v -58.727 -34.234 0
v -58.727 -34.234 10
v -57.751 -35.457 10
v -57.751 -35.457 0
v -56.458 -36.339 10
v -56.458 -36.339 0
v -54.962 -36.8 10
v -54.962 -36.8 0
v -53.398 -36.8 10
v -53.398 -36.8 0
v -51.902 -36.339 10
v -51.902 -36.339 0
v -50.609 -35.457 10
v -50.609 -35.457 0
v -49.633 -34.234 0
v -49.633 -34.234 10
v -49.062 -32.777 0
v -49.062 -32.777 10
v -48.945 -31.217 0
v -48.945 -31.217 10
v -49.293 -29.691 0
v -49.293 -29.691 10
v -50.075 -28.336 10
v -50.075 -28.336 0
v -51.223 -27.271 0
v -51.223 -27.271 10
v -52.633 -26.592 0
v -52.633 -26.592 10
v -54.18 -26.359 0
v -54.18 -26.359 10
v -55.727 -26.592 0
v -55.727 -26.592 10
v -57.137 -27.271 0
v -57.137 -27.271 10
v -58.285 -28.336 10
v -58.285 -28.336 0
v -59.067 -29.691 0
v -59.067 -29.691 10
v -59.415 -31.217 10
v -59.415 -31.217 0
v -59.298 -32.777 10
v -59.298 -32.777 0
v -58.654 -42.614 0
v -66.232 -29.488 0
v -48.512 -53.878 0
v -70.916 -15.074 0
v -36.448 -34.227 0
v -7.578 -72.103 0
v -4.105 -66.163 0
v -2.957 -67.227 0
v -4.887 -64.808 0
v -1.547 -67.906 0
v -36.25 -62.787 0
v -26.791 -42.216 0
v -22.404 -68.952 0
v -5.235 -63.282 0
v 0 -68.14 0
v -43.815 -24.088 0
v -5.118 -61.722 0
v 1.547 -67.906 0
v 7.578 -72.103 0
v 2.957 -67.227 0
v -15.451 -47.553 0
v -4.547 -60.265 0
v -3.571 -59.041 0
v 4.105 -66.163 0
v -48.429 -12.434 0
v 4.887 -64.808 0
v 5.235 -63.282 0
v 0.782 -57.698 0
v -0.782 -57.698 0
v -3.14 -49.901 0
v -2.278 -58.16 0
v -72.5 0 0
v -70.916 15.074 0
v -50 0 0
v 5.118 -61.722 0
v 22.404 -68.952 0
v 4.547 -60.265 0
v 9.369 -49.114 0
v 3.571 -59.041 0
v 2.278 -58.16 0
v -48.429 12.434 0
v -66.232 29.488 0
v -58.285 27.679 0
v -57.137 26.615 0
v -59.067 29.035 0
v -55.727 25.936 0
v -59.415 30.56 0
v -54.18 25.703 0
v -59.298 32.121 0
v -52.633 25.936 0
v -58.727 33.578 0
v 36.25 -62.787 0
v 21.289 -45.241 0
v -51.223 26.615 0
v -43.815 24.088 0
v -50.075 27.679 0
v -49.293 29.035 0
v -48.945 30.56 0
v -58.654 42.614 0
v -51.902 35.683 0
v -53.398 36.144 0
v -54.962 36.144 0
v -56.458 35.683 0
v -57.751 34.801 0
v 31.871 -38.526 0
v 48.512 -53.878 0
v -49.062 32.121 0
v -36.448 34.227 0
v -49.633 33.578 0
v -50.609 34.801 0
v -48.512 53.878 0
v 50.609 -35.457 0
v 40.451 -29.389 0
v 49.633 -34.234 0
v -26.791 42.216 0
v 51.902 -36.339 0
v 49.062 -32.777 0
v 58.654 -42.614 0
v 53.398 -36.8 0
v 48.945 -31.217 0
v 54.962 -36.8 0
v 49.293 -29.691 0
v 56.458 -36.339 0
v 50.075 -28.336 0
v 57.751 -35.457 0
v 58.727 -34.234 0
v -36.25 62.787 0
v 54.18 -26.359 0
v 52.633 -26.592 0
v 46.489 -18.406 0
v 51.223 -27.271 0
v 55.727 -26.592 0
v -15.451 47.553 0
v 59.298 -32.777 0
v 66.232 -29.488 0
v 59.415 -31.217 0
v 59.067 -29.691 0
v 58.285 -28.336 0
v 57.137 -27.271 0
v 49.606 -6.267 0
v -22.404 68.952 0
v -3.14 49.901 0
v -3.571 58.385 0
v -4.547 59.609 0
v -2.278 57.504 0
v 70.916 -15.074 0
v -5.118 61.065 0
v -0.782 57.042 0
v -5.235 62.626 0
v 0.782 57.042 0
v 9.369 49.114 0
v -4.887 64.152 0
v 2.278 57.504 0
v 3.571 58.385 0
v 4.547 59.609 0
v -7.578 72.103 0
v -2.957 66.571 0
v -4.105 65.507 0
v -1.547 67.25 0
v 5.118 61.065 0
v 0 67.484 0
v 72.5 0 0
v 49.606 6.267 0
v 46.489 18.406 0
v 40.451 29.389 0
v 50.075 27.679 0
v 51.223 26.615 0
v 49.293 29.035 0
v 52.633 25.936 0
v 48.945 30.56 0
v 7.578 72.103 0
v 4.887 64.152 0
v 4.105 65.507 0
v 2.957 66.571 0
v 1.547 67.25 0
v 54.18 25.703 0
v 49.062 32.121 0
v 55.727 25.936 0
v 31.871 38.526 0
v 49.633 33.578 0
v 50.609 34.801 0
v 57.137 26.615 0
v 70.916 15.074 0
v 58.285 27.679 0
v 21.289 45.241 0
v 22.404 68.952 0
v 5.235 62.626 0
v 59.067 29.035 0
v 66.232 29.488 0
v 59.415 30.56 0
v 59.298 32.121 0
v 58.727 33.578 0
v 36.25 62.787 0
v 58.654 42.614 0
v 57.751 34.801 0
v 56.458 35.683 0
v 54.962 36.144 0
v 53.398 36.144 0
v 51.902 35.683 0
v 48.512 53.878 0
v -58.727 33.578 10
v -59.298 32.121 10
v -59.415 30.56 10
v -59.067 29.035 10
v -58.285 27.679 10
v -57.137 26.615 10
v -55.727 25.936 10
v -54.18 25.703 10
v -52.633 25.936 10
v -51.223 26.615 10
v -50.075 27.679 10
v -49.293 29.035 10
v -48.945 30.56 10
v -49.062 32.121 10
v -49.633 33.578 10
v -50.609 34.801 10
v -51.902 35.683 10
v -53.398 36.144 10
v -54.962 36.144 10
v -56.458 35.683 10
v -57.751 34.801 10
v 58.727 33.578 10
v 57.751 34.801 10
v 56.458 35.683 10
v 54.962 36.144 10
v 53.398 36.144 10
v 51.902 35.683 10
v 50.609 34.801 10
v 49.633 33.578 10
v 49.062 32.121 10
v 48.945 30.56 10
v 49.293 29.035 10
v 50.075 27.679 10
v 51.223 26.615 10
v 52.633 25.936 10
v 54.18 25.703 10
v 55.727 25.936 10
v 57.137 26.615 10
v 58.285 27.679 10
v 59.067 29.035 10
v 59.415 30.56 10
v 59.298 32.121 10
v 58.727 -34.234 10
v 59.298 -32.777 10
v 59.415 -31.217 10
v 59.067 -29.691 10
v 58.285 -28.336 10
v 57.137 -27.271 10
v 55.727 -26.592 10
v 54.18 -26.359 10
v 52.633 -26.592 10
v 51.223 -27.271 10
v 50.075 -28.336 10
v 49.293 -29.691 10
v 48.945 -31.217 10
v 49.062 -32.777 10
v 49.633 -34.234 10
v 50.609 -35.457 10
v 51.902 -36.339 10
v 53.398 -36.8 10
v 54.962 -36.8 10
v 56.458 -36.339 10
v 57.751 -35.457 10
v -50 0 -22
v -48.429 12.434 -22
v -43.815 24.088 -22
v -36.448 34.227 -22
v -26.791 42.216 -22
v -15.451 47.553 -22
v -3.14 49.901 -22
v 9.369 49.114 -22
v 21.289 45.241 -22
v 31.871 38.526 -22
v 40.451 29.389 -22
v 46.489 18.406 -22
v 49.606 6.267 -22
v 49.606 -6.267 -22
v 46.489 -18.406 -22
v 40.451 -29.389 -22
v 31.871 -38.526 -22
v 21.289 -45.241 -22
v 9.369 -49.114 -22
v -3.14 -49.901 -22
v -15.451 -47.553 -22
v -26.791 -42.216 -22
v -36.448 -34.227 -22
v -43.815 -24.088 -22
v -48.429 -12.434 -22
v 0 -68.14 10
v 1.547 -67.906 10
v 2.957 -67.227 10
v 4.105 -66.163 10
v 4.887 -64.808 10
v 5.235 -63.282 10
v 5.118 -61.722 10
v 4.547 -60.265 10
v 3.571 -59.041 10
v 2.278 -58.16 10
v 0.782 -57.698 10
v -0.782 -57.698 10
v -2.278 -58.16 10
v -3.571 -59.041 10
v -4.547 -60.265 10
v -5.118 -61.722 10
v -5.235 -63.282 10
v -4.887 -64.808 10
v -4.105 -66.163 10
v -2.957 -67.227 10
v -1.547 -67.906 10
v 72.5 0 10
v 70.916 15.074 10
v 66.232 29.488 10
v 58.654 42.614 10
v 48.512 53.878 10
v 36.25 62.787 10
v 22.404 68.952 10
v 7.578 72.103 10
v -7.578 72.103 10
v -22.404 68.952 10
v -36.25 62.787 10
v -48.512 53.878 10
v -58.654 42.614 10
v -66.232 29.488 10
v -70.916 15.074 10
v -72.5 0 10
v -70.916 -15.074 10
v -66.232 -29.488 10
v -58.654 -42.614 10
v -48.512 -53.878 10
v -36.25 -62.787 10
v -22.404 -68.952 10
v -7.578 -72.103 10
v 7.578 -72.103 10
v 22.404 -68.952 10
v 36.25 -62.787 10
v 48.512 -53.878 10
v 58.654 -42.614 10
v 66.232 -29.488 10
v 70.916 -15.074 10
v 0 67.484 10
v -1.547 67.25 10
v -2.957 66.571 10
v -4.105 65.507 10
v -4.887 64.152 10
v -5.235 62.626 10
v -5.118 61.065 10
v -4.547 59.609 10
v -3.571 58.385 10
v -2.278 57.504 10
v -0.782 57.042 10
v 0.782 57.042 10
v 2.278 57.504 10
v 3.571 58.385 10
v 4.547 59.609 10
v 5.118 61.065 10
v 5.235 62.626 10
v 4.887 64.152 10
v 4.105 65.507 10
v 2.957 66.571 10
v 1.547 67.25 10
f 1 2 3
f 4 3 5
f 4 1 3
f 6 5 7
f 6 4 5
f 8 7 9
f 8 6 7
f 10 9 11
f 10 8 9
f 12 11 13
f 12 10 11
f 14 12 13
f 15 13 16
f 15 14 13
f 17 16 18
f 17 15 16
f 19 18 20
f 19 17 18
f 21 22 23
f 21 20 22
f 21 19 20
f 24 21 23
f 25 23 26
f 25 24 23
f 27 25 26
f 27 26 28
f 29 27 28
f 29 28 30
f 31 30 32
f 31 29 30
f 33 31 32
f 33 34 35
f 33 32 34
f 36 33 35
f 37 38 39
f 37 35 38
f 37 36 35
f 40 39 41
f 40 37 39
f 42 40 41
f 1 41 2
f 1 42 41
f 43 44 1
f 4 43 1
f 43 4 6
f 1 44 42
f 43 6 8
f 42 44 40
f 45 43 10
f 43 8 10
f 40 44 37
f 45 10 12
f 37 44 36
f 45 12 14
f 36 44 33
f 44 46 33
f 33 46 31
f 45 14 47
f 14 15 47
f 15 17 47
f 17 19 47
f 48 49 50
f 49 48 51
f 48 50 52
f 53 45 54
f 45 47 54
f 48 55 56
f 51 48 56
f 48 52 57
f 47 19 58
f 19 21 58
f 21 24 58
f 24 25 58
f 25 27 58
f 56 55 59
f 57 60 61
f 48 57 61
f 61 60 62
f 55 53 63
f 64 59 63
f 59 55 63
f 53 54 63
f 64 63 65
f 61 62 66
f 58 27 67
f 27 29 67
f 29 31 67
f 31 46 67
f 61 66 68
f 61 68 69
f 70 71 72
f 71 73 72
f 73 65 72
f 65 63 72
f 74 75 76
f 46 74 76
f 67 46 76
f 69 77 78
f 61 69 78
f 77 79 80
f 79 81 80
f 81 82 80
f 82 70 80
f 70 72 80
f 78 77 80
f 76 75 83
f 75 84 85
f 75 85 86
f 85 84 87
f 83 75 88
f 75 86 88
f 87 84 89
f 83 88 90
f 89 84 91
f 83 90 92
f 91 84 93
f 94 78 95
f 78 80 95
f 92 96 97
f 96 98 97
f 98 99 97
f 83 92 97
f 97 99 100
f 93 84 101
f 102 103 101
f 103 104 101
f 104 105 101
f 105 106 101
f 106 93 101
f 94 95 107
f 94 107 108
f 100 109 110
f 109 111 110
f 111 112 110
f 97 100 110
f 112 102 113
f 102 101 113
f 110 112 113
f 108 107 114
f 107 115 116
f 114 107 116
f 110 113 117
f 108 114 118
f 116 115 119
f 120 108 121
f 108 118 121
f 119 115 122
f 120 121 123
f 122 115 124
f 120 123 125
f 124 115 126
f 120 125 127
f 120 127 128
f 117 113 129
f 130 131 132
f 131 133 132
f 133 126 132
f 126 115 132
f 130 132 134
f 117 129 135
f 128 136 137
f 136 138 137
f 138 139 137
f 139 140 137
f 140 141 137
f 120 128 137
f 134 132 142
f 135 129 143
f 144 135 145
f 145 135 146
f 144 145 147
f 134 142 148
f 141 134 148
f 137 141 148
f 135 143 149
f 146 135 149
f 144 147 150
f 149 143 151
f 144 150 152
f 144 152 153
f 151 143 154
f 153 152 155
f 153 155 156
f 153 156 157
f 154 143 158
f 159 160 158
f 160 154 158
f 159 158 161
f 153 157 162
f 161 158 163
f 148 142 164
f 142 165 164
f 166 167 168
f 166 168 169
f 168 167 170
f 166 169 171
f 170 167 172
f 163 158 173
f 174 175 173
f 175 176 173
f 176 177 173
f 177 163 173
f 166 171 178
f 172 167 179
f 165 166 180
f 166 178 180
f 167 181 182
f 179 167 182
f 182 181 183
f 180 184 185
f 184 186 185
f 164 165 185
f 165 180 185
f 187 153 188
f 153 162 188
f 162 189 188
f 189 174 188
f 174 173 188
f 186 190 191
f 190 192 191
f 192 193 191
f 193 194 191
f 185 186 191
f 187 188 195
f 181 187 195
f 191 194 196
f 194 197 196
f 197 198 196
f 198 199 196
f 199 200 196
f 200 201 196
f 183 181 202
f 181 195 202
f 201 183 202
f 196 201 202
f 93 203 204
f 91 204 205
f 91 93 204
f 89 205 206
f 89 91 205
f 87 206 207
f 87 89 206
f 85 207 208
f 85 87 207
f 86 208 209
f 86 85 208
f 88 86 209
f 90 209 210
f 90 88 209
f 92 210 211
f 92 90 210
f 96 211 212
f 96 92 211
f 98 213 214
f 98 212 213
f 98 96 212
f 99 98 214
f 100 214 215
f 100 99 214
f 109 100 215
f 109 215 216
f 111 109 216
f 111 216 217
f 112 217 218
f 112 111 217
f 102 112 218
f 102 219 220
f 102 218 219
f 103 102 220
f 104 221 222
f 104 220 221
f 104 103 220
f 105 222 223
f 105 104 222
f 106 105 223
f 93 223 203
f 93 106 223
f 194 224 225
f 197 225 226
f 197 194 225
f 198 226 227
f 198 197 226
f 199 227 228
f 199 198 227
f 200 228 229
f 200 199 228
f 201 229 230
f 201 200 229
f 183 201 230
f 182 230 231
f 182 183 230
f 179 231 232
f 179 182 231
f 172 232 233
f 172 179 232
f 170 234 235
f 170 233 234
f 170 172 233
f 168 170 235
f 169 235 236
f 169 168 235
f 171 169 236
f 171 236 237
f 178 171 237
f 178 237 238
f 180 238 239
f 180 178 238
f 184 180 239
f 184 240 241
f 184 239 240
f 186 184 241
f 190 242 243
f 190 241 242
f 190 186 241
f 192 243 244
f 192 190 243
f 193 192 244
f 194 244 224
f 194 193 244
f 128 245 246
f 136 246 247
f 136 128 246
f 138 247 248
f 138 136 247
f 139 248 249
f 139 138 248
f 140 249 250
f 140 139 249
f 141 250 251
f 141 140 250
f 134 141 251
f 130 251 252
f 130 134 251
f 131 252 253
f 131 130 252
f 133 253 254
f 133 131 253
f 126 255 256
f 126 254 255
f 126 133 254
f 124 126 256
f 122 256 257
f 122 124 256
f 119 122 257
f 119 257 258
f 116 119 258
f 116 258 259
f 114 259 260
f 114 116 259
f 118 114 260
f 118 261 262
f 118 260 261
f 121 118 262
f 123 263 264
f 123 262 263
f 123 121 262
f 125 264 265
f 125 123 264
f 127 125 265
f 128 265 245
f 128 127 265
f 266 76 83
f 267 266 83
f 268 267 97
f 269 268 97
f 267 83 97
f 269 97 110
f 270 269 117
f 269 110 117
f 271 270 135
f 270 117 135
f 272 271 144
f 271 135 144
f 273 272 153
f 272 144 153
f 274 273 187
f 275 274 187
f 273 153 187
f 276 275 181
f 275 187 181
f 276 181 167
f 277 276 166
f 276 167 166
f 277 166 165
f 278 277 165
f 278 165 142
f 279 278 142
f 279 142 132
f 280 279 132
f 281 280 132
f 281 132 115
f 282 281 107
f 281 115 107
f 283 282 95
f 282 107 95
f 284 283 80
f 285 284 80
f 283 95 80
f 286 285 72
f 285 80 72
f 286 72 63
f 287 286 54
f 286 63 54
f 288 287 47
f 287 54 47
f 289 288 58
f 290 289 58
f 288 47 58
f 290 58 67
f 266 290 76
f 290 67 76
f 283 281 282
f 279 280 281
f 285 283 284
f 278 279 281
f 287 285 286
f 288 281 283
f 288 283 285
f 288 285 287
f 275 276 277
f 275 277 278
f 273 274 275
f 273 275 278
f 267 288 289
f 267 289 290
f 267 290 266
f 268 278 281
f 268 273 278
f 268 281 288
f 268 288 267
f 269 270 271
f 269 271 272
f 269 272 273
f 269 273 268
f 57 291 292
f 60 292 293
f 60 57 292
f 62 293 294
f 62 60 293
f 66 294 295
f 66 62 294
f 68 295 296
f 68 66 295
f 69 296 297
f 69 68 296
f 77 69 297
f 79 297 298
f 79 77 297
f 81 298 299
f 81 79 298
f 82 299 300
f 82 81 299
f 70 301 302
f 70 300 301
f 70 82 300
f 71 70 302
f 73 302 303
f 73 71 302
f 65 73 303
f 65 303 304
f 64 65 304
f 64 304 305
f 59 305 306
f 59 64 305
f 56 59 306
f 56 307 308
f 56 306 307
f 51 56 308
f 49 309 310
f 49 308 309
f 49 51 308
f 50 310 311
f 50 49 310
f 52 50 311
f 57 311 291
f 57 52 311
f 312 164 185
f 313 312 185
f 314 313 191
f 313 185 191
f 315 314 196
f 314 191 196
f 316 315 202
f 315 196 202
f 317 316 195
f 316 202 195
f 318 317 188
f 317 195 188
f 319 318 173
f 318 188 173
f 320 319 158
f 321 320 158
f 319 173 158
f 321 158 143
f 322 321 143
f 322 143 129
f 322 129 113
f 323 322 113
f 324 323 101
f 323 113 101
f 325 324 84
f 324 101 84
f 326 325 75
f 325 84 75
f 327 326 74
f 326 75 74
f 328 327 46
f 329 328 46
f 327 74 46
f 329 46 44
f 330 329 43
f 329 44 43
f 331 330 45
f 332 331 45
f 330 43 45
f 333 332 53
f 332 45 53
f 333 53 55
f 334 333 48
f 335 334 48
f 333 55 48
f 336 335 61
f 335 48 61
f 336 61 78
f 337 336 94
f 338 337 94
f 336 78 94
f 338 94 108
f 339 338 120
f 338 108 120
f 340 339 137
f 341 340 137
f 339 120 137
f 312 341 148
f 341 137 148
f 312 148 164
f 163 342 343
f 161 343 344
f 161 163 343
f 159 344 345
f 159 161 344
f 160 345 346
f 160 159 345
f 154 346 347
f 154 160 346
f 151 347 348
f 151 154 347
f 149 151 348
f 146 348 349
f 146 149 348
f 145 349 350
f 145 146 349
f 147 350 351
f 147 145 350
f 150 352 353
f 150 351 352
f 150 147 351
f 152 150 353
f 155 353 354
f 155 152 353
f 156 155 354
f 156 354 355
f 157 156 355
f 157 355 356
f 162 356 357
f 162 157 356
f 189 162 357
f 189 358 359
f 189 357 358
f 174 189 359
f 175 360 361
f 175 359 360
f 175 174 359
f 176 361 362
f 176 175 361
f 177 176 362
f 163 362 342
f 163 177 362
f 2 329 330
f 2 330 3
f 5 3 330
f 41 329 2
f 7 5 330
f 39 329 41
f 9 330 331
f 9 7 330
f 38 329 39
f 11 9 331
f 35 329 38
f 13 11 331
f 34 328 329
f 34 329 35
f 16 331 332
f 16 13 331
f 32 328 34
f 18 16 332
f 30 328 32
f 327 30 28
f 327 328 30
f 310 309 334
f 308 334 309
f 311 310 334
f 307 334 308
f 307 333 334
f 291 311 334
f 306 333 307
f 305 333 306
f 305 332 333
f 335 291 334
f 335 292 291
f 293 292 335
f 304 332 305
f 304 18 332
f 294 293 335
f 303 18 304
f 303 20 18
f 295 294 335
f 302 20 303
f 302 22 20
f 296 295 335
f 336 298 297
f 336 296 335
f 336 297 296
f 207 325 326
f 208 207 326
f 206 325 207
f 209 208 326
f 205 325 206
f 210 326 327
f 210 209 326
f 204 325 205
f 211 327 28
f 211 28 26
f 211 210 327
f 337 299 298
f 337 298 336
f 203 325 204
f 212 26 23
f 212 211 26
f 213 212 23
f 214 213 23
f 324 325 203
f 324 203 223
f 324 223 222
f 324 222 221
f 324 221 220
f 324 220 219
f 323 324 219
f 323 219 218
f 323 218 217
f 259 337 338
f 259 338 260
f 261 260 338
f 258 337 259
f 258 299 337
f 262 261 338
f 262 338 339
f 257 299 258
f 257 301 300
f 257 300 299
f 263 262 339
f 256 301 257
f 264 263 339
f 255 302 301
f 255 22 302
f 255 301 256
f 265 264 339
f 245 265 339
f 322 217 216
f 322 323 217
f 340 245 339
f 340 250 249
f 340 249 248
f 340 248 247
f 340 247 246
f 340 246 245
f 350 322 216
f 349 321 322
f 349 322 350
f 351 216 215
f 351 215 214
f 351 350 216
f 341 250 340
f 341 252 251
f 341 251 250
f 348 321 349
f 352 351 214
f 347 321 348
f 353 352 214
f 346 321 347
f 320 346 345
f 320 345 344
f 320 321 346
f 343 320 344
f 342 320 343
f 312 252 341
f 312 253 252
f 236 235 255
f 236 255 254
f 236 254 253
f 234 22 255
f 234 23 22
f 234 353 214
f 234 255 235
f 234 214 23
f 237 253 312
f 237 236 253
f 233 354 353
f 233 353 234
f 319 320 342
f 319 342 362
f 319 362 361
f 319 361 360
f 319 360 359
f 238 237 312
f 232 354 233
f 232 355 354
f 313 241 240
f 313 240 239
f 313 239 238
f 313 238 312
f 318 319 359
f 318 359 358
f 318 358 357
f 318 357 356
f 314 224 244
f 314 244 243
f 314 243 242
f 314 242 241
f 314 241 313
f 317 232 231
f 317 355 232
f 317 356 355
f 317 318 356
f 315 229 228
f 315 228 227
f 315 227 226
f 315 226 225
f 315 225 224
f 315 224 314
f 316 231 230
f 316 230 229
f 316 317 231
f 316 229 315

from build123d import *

# Parameters (mm, degrees)
CROQUIS1_R              = 72.5
SALIENTE_EXTRUIR1_DEPTH = 10
MATRIZC3_COUNT          = 6
CROQUIS13_R             = 50
SALIENTE_EXTRUIR2_DEPTH = 22


with BuildPart() as part:
    # Croquis1 → Saliente-Extruir1 (new body)
    with BuildSketch(Plane.XY):
        Circle(CROQUIS1_R)
    extrude(amount=SALIENTE_EXTRUIR1_DEPTH)

    # Croquis12 → Taladro roscado M12x1.51 (revolve, cut)
    with BuildSketch(Plane(origin=(0, 62.233623097, 0), x_dir=(0, 1, 0), z_dir=(1, 0, 0))):
        Polygon((0, 0), (0, 34.65451825), (5.25, 31.5), (5.25, 0), align=None)
    taladro_roscado_m12x1_51 = revolve(axis=Axis((0, 62.233623097, -6.35), (0, 0, 1)), mode=Mode.SUBTRACT)

    # MatrizC3: Taladro roscado M12x1.51 ×6 about axis
    matrizc3_axis = Axis((0, -0.328058282, 0), (0, 0, 1))
    for i in range(1, MATRIZC3_COUNT):
        add(taladro_roscado_m12x1_51.rotate(matrizc3_axis, i * 360 / MATRIZC3_COUNT), mode=Mode.SUBTRACT)

    # Croquis13 → Saliente-Extruir2 (add)
    with BuildSketch(Plane(origin=(0, 0, 0), x_dir=(-1, 0, 0), z_dir=(0, 0, -1))):
        Circle(CROQUIS13_R)
    extrude(amount=SALIENTE_EXTRUIR2_DEPTH)


solid = part.part
